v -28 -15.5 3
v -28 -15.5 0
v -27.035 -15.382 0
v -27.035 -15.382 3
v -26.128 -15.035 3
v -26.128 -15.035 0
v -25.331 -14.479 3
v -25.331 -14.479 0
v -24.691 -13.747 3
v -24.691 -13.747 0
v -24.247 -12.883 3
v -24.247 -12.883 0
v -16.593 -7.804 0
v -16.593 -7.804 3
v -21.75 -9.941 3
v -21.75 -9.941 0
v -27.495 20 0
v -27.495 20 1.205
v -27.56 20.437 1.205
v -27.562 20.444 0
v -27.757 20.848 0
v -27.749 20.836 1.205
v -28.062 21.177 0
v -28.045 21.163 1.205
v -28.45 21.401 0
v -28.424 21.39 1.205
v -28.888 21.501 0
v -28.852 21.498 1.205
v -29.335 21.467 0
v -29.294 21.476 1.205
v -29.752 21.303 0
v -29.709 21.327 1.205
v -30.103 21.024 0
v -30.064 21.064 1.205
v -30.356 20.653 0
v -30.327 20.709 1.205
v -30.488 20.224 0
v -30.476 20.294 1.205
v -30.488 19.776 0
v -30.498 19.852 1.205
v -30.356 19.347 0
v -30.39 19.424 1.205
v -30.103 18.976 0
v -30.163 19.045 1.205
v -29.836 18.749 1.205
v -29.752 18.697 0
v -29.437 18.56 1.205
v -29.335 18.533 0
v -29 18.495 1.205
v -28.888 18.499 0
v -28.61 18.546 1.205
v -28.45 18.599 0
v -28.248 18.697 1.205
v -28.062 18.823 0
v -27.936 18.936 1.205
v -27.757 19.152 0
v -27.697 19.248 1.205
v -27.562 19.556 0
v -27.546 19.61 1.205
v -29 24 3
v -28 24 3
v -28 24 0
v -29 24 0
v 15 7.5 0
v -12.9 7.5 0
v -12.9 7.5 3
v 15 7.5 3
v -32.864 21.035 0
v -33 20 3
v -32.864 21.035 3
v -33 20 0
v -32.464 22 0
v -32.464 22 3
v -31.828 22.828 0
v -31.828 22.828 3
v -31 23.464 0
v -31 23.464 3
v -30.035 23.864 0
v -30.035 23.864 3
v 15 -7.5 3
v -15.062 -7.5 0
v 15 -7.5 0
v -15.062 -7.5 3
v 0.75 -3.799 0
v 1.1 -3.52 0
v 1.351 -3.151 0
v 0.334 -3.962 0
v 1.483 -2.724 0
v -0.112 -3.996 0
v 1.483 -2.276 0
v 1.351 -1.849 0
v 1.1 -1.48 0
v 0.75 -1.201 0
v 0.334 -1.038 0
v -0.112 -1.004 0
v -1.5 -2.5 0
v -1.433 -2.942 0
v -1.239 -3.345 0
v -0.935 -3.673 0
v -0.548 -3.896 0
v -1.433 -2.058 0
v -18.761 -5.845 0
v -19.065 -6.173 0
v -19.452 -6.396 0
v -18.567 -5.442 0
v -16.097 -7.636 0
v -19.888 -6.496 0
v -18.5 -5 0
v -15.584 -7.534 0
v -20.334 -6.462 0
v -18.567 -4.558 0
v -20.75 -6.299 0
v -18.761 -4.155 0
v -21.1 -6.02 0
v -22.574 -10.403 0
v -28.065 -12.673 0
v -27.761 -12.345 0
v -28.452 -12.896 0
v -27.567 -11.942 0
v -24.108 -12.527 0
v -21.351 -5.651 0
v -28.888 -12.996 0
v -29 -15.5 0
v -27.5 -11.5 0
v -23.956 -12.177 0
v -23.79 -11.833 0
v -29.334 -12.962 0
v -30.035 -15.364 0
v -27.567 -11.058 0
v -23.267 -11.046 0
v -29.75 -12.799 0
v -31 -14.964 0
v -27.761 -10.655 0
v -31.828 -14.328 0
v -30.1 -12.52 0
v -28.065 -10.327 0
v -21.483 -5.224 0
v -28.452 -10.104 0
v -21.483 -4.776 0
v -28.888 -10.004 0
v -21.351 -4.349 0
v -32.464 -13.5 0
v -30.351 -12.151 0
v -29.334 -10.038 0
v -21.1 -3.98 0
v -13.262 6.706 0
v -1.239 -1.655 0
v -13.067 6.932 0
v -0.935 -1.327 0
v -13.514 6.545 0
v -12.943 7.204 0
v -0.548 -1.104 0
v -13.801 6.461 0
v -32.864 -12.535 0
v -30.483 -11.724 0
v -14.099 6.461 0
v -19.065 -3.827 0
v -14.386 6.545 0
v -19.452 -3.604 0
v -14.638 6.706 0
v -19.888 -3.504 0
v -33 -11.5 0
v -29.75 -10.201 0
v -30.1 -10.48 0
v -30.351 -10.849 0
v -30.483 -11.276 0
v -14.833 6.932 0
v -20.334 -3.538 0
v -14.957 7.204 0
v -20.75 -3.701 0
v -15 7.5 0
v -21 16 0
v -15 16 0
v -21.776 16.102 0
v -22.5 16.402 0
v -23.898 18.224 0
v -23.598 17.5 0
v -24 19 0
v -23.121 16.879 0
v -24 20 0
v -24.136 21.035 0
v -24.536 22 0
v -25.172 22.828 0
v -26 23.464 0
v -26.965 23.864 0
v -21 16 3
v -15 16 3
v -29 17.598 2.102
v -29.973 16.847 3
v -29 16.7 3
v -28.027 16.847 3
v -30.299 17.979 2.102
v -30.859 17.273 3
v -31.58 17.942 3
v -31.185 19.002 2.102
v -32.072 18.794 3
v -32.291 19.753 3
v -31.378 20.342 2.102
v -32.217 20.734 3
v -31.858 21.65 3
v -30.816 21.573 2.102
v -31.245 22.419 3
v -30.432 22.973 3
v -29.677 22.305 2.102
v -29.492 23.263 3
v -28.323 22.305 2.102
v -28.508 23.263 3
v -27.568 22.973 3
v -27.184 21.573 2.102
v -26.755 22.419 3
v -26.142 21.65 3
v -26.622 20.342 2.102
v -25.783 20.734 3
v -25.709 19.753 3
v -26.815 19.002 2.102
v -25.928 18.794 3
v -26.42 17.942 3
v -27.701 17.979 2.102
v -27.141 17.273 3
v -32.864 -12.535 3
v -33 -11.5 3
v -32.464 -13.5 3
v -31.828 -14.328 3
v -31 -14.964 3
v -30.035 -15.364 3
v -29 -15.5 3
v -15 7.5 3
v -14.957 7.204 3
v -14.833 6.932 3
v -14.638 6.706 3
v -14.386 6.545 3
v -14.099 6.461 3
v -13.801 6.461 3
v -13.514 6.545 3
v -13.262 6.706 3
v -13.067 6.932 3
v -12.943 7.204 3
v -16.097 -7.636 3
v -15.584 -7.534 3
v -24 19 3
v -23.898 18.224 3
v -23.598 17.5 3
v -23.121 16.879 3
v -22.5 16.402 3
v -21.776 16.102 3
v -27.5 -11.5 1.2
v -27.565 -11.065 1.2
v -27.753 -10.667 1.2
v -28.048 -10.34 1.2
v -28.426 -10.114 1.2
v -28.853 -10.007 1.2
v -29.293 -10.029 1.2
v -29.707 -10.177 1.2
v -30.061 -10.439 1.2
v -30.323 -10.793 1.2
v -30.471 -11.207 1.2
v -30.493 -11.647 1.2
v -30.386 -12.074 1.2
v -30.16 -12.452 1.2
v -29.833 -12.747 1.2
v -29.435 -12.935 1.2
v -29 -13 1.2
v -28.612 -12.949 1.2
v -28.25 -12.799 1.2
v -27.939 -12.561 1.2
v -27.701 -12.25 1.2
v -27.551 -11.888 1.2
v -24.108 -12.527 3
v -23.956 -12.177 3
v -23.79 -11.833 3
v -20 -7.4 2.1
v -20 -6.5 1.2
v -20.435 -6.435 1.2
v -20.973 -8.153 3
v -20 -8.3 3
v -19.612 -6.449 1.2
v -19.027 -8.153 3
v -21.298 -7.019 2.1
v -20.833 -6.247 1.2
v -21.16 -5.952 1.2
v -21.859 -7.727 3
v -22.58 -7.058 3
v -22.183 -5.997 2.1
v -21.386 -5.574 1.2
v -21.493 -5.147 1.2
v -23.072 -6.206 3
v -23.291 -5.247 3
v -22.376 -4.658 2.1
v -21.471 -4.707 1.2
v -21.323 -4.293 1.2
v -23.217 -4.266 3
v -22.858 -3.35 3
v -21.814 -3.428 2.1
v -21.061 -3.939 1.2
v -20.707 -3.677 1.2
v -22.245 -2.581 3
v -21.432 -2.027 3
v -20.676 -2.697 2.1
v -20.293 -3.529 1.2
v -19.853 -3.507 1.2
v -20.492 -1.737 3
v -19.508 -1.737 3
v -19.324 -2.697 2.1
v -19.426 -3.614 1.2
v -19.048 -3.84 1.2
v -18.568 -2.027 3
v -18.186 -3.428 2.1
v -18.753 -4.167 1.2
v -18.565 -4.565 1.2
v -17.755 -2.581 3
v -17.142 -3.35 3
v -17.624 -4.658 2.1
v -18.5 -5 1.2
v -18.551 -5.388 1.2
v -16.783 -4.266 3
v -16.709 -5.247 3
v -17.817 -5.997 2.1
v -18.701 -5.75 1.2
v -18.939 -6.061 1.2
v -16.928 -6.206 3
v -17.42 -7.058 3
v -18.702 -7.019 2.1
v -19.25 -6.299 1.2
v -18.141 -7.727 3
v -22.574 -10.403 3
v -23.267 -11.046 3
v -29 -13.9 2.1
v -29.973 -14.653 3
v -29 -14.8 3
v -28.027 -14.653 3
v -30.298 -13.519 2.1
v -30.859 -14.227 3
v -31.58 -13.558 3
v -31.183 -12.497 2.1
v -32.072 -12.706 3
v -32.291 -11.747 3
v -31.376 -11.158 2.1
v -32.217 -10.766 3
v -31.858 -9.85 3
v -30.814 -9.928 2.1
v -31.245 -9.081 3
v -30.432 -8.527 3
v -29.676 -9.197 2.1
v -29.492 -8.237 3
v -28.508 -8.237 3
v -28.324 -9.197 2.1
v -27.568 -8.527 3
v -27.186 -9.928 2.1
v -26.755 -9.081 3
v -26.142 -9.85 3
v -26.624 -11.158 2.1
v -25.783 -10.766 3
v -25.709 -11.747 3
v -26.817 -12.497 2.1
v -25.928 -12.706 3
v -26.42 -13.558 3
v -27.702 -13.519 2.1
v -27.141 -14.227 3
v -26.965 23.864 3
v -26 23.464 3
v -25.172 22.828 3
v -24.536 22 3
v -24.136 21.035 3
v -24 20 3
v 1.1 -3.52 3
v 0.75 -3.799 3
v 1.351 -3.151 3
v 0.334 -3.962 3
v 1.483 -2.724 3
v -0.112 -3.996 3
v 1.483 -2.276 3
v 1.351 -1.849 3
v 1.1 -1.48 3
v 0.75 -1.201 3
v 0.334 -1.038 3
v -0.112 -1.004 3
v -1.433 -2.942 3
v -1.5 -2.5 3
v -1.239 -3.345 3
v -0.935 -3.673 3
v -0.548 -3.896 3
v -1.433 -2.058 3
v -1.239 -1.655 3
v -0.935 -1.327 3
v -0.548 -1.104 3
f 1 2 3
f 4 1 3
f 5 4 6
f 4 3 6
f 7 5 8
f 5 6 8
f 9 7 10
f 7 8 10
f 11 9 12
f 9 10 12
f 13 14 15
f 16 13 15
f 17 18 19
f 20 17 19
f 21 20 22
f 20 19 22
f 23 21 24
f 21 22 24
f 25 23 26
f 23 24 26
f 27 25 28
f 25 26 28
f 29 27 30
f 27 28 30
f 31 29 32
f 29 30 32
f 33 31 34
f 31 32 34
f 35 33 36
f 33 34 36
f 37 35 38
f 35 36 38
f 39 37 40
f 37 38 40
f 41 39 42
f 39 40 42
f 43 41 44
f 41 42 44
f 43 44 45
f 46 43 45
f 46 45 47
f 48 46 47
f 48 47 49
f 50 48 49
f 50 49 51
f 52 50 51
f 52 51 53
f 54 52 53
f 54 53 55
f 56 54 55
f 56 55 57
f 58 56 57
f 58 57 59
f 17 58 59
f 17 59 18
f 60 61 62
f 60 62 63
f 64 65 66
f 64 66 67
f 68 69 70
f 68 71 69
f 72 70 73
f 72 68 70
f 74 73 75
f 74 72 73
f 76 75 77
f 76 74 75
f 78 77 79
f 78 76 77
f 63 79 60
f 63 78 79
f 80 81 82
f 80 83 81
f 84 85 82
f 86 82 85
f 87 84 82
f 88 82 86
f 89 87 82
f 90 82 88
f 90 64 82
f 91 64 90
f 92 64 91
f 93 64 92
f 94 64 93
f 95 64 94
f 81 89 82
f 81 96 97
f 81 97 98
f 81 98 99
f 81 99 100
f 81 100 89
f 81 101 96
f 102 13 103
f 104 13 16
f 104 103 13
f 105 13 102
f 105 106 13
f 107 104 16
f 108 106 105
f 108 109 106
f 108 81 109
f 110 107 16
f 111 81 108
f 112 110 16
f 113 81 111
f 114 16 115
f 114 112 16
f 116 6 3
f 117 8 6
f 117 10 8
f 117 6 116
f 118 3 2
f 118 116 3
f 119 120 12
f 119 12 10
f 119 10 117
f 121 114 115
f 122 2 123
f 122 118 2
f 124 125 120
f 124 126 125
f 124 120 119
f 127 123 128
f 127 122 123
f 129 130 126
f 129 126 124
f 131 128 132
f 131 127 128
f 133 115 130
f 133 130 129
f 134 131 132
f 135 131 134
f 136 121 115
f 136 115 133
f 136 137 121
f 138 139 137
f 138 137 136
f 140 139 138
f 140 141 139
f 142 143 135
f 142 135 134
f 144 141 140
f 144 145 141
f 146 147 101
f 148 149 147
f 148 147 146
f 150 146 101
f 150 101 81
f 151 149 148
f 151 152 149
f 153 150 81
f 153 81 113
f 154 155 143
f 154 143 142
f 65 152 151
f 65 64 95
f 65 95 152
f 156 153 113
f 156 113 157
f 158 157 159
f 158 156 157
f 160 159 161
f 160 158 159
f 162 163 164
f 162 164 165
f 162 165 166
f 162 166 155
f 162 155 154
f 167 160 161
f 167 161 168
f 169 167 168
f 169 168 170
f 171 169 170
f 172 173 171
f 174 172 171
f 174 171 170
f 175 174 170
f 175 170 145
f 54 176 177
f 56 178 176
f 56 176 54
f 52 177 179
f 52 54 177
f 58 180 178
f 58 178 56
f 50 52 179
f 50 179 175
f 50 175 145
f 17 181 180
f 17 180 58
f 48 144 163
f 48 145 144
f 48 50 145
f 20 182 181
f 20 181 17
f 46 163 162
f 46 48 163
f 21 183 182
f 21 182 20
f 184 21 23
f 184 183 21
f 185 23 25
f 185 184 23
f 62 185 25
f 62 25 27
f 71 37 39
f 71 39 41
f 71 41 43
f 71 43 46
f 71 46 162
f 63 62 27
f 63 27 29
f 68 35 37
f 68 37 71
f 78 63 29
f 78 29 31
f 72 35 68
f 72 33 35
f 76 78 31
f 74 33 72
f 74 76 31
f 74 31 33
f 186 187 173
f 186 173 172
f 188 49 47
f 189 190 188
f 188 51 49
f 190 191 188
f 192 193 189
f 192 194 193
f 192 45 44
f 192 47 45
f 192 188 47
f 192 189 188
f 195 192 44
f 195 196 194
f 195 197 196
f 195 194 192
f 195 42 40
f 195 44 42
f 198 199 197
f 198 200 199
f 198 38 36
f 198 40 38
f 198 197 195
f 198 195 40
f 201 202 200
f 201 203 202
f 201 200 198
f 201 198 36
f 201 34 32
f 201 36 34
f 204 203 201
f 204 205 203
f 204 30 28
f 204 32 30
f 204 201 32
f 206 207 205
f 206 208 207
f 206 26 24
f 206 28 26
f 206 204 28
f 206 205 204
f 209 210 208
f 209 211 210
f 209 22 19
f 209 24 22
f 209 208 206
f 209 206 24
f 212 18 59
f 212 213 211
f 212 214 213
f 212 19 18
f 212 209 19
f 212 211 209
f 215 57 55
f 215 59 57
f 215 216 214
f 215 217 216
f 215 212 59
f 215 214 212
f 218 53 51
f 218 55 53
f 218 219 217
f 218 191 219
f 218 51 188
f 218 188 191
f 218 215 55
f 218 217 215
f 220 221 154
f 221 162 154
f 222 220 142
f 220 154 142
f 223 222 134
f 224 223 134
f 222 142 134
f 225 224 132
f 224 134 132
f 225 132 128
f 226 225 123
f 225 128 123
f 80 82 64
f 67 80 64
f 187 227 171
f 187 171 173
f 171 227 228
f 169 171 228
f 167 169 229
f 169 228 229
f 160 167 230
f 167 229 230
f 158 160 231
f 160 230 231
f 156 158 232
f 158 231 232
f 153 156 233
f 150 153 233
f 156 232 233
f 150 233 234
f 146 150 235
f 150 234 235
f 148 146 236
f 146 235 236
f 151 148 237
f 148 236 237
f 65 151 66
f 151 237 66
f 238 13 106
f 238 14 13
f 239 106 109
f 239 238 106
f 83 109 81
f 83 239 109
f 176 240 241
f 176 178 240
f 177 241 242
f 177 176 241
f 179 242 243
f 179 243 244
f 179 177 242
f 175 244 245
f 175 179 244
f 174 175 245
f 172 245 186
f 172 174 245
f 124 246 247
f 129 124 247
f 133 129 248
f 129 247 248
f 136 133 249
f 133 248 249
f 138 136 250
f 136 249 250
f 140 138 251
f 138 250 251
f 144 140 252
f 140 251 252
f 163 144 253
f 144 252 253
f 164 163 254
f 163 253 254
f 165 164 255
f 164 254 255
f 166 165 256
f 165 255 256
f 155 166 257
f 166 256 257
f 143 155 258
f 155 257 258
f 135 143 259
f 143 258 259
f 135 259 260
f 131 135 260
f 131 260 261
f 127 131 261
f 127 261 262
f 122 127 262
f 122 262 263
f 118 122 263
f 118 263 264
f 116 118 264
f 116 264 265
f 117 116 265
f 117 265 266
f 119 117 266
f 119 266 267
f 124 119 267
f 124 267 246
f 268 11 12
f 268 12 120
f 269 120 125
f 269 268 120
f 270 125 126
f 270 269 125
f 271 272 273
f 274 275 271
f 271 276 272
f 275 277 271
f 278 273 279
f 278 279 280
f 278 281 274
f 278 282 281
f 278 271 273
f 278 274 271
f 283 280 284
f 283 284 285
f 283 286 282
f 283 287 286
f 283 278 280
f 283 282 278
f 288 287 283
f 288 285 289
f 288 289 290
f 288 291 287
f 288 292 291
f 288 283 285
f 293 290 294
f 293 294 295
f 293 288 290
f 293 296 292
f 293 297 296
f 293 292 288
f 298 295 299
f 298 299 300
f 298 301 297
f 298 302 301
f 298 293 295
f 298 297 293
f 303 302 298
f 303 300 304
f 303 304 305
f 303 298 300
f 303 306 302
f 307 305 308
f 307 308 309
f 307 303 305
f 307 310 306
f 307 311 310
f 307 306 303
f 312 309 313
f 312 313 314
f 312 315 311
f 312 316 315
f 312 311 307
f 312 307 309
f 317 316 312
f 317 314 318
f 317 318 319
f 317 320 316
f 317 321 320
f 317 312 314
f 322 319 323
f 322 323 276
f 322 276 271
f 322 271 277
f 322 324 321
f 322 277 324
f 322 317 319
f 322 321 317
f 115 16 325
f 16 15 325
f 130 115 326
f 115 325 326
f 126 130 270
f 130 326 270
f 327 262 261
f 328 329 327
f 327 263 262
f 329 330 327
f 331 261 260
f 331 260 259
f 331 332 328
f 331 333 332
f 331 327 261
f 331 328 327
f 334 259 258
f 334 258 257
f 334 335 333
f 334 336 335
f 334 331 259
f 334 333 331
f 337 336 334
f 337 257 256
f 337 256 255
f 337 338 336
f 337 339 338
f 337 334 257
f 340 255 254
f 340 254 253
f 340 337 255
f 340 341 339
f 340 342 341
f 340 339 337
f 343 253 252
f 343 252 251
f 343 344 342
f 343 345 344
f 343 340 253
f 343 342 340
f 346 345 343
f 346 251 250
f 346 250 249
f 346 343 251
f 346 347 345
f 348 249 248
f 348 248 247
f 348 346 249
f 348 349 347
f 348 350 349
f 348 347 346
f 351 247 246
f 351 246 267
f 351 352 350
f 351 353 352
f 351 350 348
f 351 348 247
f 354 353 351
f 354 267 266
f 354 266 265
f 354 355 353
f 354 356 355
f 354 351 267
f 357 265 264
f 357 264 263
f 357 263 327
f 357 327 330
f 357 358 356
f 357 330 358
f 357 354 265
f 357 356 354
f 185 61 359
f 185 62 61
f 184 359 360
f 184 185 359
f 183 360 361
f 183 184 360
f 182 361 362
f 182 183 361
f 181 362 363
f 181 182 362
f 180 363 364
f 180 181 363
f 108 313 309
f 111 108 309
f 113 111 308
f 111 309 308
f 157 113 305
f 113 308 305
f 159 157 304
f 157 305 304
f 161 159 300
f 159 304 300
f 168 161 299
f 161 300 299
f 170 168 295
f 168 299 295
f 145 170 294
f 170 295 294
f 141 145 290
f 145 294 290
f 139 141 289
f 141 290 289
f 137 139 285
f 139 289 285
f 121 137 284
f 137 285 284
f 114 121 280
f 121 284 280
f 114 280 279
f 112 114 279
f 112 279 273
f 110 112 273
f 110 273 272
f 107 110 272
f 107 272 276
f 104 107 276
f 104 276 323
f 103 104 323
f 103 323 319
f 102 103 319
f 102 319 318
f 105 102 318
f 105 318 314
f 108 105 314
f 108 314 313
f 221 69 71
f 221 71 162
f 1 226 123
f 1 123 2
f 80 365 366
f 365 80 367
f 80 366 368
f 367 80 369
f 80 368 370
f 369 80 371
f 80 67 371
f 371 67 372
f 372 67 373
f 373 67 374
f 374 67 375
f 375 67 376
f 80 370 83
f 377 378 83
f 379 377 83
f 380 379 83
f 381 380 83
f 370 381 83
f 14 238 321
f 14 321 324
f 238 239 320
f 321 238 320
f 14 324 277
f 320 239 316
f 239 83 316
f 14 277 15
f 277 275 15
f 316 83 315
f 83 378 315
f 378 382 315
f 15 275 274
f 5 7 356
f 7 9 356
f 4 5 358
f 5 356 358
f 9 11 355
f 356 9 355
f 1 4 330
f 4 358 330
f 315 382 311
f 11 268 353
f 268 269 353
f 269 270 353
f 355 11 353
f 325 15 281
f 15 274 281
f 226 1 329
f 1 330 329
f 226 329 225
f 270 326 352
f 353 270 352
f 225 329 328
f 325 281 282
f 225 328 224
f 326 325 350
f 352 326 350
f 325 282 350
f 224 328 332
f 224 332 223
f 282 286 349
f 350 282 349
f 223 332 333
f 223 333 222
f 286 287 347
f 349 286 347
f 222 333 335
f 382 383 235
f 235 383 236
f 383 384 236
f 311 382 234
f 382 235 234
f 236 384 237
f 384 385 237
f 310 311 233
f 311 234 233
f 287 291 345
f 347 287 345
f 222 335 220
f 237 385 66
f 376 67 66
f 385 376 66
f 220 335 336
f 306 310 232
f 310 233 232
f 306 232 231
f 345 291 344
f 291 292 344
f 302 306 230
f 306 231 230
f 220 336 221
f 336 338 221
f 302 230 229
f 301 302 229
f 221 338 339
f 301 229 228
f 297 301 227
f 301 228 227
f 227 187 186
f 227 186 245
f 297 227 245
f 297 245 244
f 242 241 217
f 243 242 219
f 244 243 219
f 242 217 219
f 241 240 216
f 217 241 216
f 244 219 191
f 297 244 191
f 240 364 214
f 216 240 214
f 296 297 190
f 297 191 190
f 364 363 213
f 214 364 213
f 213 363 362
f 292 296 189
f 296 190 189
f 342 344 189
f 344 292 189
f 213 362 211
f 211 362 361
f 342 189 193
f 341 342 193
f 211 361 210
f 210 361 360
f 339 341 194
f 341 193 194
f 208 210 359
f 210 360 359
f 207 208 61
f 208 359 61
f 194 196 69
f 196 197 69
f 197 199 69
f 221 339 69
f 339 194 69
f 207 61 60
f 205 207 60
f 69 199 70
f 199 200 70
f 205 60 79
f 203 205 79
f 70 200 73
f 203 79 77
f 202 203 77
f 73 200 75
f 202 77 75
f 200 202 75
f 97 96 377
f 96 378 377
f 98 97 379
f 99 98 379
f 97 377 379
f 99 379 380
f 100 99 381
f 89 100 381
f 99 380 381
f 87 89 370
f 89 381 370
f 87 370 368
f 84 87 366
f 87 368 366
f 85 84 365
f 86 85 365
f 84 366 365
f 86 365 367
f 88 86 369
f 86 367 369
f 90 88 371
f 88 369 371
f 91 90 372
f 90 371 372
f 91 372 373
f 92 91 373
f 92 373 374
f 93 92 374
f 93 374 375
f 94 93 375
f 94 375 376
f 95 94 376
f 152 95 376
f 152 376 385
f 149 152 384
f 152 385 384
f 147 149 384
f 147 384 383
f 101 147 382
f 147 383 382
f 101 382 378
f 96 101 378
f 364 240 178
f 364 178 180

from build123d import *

# Parameters (mm, degrees)
SKETCH_1_W                  = 30
SKETCH_1_H                  = 15
EXTRUDE_1_DEPTH             = 3
EXTRUDE_2_DEPTH             = 3
FILLET_1_R                  = 4
FILLET_2_R                  = 3
FILLET_5_R                  = 4
FILLET_6_R                  = 4
SKETCH_3_R                  = 1.05
CUT_EXTRUDE_1_DEPTH         = 3
SKETCH_4_R                  = 1.505
CUT_EXTRUDE_2_DEPTH         = 40
EXTRUDE_START               = -11
EXTRUDE_3_OUTLINE_W         = 5.656854249
EXTRUDE_3_OUTLINE_H         = 3
EXTRUDE_3_DEPTH             = 2.161165235
SKETCH_7_R                  = 1.5
CUT_EXTRUDE_3_DEPTH         = 40
FILLET_7_R                  = 10
FILLET_8_R                  = 10
SKETCH_8_R                  = 1.5
CUT_EXTRUDE_4_DEPTH         = 40
EXTRUDE_4_DEPTH             = 3
HOLE_WIZARD_M3_1_AT_2_COUNT = 2
HOLE_WIZARD_M3_1_AT_2_PITCH = 26.570660511
HOLE_WIZARD_M3_1_AT_3_COUNT = 2
HOLE_WIZARD_M3_1_AT_3_PITCH = 31.5
FILLET_9_R                  = 4
SKETCH_12_R                 = 1.5
CUT_EXTRUDE_5_DEPTH         = 20.5


with BuildPart() as part:
    # 草图1 → 凸台-拉伸1 (new body)
    with BuildSketch(Plane.XY):
        Rectangle(SKETCH_1_W, SKETCH_1_H)
    extrude(amount=EXTRUDE_1_DEPTH)

    # 草图2 → 凸台-拉伸2 (add)
    with BuildSketch(Plane.XY.offset(3)):
        Polygon((-15, 7.5), (-15, 16), (-24, 16), (-24, 24), (-33, 24), (-33, -15.5), (-24, -15.5), (-24, -7.5), (-15, -7.5), align=None)
    extrude(amount=-EXTRUDE_2_DEPTH)

    # 圆角1
    fillet_1_edges = [part.edges().sort_by_distance(p)[0] for p in [
        (-24, 24, 1.5),
        (-33, 24, 1.5),
    ]]
    fillet(fillet_1_edges, radius=FILLET_1_R)

    # 圆角2
    fillet_2_edges = [part.edges().sort_by_distance(p)[0] for p in [
        (-24, 16, 1.5),
    ]]
    fillet(fillet_2_edges, radius=FILLET_2_R)

    # 圆角5
    fillet_5_edges = [part.edges().sort_by_distance(p)[0] for p in [
        (-33, -15.5, 1.5),
        (-24, -15.5, 1.5),
    ]]
    fillet(fillet_5_edges, radius=FILLET_5_R)

    # 圆角6
    fillet_6_edges = [part.edges().sort_by_distance(p)[0] for p in [
        (-24, -7.5, 1.5),
    ]]
    fillet(fillet_6_edges, radius=FILLET_6_R - 0.0001)  # a hair under: the kernel refuses the full size

    # 草图3 → 切除-拉伸1 (cut)
    with BuildSketch(Plane.XY.offset(3)):
        with Locations((-13.95, 7.5)):
            Circle(SKETCH_3_R)
    extrude(amount=-CUT_EXTRUDE_1_DEPTH, mode=Mode.SUBTRACT)

    # 草图4 → 切除-拉伸2 (cut)
    with BuildSketch(Plane.XY.offset(3)):
        with Locations((-29, 20)):
            Circle(SKETCH_4_R)
    extrude(amount=-CUT_EXTRUDE_2_DEPTH, mode=Mode.SUBTRACT)

    # 凸台-拉伸3: read off the stored shape, not the designer's step
    # 凸台-拉伸3 outline → 凸台-拉伸3 (add)
    with BuildSketch(Plane(origin=(0, 0, 0), x_dir=(0.7071067811865471, 0.707106781186548, 0), z_dir=(0.707106781186548, -0.707106781186547, 0)).offset(EXTRUDE_START)):
        with Locations((-22.273863608, 1.5)):
            Rectangle(EXTRUDE_3_OUTLINE_W, EXTRUDE_3_OUTLINE_H)
    extrude(amount=EXTRUDE_3_DEPTH)

    # 草图7 → 切除-拉伸3 (cut)
    with BuildSketch(Plane.XY.offset(3)):
        with Locations((-20, -5)):
            Circle(SKETCH_7_R)
    extrude(amount=-CUT_EXTRUDE_3_DEPTH, mode=Mode.SUBTRACT)

    # 圆角7
    fillet_7_edges = [part.edges().sort_by_distance(p)[0] for p in [
        (-20, -7.5, 1.5),
    ]]
    fillet(fillet_7_edges, radius=FILLET_7_R)

    # 圆角8
    # the kernel refuses this fillet: 10 mm, written as the material it adds along each edge
    with BuildSketch(Plane(origin=(-24, -11.5, 3), x_dir=(0.7071067811080579, 0.7071067812650372, 0), z_dir=(0, 0, -1))) as fillet_8_piece_1:
        with BuildLine():
            CenterArc((3.037620293, 9.883358261), FILLET_8_R, 245.228316877, 16.01201465)
            Line((-1.152413577, 0.803511557), (-1.236214254, 0.621914623))
            ThreePointArc((-1.236214254, 0.621914623), (-0.655043014, 0.288687166), (-0.141421356, -0.141421356))
            Line((-0.141421356, -0.141421356), (0, -0.2))
            ThreePointArc((0, -0.2), (0.757359313, -0.2), (1.484260592, -0.197667165))
            Line((1.484260592, -0.197667165), (1.514718626, 0))
        make_face()
    extrude(amount=3)

    # 草图8 → 切除-拉伸4 (cut)
    with BuildSketch(Plane.XY.offset(3)):
        with Locations((-29, -11.5)):
            Circle(SKETCH_8_R)
    extrude(amount=-CUT_EXTRUDE_4_DEPTH, mode=Mode.SUBTRACT)

    # 草图11 → 凸台-拉伸4 (add)
    with BuildSketch(Plane.XY.offset(3)):
        with BuildLine():
            Line((-15.857864376, -7.5), (-22.928932188, -10.428932188))
            ThreePointArc((-22.928932188, -10.428932188), (-19.6846987, -8.261204675), (-15.857864376, -7.5))
        make_face()
    extrude(amount=-EXTRUDE_4_DEPTH)

    # 草图10 → M3 十字槽半沉头木螺钉的锥形沉头孔1 (revolve, cut)
    with BuildSketch(Plane(origin=(-29, 20, 3), x_dir=(0, -1, 0), z_dir=(1, 0, 0))):
        Polygon((0, 0), (0, 3), (1.5, 3), (1.5, 1.8), (3.3, 0), align=None)
    hole_wizard_m3_1 = revolve(axis=Axis((-29, 20, 9.35), (0, 0, -1)), mode=Mode.SUBTRACT)

    # M3 十字槽半沉头木螺钉的锥形沉头孔1 at 2: M3 十字槽半沉头木螺钉的锥形沉头孔1 ×2
    with Locations(*[Vector(0.33871946827274174, -0.9408874118687268, 0) * (i * HOLE_WIZARD_M3_1_AT_2_PITCH) for i in range(1, HOLE_WIZARD_M3_1_AT_2_COUNT)]):
        add(hole_wizard_m3_1, mode=Mode.SUBTRACT)

    # M3 十字槽半沉头木螺钉的锥形沉头孔1 at 3: M3 十字槽半沉头木螺钉的锥形沉头孔1 ×2
    with Locations(*[(0, -i * HOLE_WIZARD_M3_1_AT_3_PITCH, 0) for i in range(1, HOLE_WIZARD_M3_1_AT_3_COUNT)]):
        add(hole_wizard_m3_1, mode=Mode.SUBTRACT)

    # 圆角9
    fillet_9_edges = [part.edges().sort_by_distance(p)[0] for p in [
        (-15.857864377, -7.5, 1.5),
        (-22.928932188, -10.428932188, 1.5),
    ]]
    fillet(fillet_9_edges, radius=FILLET_9_R)

    # 草图12 → 切除-拉伸5 (cut, symmetric)
    with BuildSketch(Plane.XY.offset(3)):
        with Locations(Location((0, -2.5, 0), (0, 0, 180))):
            Circle(SKETCH_12_R)
    extrude(amount=CUT_EXTRUDE_5_DEPTH, both=True, mode=Mode.SUBTRACT)


solid = part.part
